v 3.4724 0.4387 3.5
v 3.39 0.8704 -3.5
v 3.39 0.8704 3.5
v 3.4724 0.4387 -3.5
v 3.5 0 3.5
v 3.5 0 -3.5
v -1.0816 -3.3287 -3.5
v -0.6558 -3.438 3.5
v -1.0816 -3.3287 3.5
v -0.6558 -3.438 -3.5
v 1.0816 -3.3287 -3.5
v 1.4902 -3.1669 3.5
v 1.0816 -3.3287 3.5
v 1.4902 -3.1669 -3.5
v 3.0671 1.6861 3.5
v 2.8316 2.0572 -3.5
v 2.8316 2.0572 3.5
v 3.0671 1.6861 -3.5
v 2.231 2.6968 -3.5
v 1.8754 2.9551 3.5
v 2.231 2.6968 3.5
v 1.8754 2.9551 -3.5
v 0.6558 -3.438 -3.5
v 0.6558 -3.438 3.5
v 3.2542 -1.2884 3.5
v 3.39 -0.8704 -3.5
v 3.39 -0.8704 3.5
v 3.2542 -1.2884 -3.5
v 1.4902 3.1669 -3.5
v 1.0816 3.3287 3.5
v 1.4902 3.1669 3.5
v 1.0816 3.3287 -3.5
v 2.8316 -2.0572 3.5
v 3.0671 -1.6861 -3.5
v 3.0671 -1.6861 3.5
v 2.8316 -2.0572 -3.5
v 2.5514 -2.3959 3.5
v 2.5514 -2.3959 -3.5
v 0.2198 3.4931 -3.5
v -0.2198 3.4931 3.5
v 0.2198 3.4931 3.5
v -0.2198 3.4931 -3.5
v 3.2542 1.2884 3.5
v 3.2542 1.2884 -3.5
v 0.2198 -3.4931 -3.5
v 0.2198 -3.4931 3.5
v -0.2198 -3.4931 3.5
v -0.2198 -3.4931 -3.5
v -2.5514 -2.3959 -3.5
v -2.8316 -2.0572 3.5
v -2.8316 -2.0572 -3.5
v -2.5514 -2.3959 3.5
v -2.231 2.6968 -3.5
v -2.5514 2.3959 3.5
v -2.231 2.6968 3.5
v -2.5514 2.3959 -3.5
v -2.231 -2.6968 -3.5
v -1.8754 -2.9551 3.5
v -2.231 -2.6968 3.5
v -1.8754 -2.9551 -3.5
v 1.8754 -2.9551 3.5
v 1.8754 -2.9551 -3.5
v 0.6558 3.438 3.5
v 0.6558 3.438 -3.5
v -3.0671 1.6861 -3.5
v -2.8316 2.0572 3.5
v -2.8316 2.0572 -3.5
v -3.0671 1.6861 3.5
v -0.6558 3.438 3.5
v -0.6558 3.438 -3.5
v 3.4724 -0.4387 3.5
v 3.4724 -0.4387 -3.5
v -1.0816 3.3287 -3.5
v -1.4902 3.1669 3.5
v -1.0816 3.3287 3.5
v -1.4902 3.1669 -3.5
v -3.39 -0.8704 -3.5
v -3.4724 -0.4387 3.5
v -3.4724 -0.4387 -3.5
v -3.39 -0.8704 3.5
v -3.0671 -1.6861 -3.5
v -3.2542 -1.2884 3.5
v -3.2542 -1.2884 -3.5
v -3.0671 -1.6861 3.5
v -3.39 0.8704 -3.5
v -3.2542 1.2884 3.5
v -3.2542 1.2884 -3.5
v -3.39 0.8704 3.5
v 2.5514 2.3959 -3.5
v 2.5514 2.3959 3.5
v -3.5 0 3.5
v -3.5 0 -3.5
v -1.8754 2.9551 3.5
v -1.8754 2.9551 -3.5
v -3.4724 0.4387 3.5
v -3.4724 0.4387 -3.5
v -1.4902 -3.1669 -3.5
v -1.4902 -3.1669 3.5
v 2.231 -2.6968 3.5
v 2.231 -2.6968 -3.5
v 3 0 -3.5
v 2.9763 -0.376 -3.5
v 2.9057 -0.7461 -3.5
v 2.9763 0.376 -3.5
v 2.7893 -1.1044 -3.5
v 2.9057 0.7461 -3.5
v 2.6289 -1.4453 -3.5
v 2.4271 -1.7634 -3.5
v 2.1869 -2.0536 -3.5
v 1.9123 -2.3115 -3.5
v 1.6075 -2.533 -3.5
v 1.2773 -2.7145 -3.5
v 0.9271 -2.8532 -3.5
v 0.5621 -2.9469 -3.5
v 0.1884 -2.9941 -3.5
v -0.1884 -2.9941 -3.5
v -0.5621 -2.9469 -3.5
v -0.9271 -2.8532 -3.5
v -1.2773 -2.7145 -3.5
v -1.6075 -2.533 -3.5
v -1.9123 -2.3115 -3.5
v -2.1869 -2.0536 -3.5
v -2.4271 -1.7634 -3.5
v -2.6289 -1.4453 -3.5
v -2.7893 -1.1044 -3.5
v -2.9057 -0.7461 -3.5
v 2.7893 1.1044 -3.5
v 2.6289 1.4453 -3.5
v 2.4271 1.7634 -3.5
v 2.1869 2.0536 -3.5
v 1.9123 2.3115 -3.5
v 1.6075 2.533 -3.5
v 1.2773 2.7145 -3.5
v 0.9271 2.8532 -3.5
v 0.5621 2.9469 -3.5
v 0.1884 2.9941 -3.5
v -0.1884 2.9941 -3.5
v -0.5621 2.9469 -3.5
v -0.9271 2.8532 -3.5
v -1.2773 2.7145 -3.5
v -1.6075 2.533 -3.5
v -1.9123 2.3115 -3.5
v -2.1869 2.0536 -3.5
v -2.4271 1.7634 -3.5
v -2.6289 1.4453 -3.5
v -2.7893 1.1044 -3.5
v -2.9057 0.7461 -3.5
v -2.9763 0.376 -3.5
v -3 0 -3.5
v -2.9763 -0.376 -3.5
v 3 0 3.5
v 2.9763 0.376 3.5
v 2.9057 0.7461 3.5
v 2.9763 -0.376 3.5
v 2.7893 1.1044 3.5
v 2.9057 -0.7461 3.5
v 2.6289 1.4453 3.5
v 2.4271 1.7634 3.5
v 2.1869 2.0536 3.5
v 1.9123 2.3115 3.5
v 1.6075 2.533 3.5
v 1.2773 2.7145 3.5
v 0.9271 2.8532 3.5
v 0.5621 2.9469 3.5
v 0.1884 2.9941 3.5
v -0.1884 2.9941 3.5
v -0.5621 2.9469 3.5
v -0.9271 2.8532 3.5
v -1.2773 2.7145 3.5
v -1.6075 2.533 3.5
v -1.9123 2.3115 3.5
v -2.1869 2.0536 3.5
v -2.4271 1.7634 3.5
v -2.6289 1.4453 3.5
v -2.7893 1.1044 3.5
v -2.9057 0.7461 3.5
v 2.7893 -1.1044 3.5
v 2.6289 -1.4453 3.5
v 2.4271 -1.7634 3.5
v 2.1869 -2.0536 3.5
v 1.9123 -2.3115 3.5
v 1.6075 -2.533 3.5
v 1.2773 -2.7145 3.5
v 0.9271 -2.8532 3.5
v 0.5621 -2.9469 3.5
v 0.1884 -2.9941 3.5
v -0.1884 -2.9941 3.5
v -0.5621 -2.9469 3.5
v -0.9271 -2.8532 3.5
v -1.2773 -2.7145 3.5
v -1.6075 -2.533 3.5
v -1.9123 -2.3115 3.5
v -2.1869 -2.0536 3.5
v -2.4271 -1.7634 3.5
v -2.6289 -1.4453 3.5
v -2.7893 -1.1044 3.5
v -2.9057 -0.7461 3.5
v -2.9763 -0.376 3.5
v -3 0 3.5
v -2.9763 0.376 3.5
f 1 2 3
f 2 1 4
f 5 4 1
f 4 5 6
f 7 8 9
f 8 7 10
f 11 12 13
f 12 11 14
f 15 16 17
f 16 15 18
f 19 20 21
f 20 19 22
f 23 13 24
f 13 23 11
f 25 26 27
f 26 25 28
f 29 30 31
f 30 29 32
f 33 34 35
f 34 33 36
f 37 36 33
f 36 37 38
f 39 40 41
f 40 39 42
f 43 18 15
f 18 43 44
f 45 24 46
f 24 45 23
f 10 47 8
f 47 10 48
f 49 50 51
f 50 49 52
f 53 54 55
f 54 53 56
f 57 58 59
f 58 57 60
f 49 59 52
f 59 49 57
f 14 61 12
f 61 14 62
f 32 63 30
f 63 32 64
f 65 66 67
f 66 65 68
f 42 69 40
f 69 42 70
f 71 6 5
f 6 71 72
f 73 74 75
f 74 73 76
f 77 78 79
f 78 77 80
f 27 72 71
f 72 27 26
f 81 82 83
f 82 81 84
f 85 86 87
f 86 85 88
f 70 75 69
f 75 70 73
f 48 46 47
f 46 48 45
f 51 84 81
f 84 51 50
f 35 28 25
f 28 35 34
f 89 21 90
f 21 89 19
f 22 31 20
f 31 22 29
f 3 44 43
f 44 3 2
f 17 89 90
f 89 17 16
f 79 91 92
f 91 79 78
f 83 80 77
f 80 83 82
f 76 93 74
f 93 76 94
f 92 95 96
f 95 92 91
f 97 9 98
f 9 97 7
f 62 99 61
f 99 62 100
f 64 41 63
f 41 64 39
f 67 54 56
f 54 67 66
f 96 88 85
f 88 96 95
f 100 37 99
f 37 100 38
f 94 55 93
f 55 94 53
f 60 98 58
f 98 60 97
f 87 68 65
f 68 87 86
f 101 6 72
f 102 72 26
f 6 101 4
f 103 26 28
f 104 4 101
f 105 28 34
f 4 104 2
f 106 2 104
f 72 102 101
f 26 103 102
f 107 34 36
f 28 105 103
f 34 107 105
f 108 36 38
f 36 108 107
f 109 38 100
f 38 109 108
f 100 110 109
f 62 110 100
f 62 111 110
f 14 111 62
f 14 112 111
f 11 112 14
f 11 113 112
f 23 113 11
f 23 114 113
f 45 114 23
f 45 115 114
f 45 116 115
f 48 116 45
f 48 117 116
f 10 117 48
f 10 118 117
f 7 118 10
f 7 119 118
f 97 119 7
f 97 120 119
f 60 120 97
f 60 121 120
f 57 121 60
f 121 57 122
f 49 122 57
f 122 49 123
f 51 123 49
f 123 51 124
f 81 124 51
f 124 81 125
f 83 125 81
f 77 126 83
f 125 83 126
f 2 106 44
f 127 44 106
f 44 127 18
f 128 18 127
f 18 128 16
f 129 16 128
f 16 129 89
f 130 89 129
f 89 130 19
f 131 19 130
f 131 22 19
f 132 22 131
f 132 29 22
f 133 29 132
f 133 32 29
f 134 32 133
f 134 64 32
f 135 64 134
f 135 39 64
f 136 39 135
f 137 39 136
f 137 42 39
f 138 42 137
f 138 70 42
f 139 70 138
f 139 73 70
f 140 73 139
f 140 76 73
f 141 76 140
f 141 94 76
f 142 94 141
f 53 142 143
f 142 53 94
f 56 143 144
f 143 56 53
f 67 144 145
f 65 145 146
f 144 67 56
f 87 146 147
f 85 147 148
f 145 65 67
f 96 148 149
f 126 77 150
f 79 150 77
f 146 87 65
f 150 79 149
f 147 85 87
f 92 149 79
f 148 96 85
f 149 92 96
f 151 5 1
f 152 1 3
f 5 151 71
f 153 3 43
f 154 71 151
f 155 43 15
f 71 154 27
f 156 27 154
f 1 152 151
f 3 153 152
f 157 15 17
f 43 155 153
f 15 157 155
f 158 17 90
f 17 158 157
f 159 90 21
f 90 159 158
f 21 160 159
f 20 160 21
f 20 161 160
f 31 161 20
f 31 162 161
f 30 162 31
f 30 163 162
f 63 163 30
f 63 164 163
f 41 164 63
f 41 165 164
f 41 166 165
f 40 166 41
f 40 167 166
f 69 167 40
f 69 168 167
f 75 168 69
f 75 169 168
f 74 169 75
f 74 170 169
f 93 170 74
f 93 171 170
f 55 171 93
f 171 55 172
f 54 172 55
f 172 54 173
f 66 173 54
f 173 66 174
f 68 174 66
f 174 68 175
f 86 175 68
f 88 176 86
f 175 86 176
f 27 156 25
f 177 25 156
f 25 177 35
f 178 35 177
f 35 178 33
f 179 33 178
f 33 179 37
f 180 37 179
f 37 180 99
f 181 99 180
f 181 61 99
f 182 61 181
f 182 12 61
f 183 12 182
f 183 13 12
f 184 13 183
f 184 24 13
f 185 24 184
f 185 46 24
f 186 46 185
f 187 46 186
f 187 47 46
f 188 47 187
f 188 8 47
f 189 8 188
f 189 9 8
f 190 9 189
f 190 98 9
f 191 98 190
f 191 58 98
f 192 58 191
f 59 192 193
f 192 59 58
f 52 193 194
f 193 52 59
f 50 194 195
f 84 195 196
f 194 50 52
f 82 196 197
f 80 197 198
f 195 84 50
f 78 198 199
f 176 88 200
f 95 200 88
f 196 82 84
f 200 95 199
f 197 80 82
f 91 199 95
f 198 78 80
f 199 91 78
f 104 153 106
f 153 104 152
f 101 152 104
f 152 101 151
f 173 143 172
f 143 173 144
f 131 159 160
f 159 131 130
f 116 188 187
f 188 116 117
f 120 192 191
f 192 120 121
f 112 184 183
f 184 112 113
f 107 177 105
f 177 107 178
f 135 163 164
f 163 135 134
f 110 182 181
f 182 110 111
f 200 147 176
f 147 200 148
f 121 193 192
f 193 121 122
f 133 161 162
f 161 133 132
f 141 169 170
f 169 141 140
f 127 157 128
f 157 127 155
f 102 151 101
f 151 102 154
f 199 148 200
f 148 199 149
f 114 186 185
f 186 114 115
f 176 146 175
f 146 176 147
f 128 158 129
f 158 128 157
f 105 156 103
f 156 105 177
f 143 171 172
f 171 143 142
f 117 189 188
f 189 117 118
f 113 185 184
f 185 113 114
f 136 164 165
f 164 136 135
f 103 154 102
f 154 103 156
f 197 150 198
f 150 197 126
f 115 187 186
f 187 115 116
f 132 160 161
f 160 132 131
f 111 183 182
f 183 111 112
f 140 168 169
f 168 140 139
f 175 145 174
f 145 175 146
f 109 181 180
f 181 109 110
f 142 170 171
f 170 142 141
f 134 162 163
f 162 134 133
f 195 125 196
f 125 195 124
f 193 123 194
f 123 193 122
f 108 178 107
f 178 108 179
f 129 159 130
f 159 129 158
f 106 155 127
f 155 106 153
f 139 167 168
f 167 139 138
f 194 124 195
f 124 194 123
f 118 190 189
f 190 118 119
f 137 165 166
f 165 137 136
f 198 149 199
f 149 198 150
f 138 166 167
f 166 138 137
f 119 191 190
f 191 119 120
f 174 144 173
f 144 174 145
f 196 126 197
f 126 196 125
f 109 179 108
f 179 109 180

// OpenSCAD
$fn = 50;


difference() {
	union() {
		translate(v = [0, 0, -3.5000000000]) {
			cylinder(h = 7, r = 3.5000000000);
		}
	}
	union() {
		translate(v = [0, 0, -100.0000000000]) {
			cylinder(h = 200, r = 3.0000000000);
		}
	}
}
